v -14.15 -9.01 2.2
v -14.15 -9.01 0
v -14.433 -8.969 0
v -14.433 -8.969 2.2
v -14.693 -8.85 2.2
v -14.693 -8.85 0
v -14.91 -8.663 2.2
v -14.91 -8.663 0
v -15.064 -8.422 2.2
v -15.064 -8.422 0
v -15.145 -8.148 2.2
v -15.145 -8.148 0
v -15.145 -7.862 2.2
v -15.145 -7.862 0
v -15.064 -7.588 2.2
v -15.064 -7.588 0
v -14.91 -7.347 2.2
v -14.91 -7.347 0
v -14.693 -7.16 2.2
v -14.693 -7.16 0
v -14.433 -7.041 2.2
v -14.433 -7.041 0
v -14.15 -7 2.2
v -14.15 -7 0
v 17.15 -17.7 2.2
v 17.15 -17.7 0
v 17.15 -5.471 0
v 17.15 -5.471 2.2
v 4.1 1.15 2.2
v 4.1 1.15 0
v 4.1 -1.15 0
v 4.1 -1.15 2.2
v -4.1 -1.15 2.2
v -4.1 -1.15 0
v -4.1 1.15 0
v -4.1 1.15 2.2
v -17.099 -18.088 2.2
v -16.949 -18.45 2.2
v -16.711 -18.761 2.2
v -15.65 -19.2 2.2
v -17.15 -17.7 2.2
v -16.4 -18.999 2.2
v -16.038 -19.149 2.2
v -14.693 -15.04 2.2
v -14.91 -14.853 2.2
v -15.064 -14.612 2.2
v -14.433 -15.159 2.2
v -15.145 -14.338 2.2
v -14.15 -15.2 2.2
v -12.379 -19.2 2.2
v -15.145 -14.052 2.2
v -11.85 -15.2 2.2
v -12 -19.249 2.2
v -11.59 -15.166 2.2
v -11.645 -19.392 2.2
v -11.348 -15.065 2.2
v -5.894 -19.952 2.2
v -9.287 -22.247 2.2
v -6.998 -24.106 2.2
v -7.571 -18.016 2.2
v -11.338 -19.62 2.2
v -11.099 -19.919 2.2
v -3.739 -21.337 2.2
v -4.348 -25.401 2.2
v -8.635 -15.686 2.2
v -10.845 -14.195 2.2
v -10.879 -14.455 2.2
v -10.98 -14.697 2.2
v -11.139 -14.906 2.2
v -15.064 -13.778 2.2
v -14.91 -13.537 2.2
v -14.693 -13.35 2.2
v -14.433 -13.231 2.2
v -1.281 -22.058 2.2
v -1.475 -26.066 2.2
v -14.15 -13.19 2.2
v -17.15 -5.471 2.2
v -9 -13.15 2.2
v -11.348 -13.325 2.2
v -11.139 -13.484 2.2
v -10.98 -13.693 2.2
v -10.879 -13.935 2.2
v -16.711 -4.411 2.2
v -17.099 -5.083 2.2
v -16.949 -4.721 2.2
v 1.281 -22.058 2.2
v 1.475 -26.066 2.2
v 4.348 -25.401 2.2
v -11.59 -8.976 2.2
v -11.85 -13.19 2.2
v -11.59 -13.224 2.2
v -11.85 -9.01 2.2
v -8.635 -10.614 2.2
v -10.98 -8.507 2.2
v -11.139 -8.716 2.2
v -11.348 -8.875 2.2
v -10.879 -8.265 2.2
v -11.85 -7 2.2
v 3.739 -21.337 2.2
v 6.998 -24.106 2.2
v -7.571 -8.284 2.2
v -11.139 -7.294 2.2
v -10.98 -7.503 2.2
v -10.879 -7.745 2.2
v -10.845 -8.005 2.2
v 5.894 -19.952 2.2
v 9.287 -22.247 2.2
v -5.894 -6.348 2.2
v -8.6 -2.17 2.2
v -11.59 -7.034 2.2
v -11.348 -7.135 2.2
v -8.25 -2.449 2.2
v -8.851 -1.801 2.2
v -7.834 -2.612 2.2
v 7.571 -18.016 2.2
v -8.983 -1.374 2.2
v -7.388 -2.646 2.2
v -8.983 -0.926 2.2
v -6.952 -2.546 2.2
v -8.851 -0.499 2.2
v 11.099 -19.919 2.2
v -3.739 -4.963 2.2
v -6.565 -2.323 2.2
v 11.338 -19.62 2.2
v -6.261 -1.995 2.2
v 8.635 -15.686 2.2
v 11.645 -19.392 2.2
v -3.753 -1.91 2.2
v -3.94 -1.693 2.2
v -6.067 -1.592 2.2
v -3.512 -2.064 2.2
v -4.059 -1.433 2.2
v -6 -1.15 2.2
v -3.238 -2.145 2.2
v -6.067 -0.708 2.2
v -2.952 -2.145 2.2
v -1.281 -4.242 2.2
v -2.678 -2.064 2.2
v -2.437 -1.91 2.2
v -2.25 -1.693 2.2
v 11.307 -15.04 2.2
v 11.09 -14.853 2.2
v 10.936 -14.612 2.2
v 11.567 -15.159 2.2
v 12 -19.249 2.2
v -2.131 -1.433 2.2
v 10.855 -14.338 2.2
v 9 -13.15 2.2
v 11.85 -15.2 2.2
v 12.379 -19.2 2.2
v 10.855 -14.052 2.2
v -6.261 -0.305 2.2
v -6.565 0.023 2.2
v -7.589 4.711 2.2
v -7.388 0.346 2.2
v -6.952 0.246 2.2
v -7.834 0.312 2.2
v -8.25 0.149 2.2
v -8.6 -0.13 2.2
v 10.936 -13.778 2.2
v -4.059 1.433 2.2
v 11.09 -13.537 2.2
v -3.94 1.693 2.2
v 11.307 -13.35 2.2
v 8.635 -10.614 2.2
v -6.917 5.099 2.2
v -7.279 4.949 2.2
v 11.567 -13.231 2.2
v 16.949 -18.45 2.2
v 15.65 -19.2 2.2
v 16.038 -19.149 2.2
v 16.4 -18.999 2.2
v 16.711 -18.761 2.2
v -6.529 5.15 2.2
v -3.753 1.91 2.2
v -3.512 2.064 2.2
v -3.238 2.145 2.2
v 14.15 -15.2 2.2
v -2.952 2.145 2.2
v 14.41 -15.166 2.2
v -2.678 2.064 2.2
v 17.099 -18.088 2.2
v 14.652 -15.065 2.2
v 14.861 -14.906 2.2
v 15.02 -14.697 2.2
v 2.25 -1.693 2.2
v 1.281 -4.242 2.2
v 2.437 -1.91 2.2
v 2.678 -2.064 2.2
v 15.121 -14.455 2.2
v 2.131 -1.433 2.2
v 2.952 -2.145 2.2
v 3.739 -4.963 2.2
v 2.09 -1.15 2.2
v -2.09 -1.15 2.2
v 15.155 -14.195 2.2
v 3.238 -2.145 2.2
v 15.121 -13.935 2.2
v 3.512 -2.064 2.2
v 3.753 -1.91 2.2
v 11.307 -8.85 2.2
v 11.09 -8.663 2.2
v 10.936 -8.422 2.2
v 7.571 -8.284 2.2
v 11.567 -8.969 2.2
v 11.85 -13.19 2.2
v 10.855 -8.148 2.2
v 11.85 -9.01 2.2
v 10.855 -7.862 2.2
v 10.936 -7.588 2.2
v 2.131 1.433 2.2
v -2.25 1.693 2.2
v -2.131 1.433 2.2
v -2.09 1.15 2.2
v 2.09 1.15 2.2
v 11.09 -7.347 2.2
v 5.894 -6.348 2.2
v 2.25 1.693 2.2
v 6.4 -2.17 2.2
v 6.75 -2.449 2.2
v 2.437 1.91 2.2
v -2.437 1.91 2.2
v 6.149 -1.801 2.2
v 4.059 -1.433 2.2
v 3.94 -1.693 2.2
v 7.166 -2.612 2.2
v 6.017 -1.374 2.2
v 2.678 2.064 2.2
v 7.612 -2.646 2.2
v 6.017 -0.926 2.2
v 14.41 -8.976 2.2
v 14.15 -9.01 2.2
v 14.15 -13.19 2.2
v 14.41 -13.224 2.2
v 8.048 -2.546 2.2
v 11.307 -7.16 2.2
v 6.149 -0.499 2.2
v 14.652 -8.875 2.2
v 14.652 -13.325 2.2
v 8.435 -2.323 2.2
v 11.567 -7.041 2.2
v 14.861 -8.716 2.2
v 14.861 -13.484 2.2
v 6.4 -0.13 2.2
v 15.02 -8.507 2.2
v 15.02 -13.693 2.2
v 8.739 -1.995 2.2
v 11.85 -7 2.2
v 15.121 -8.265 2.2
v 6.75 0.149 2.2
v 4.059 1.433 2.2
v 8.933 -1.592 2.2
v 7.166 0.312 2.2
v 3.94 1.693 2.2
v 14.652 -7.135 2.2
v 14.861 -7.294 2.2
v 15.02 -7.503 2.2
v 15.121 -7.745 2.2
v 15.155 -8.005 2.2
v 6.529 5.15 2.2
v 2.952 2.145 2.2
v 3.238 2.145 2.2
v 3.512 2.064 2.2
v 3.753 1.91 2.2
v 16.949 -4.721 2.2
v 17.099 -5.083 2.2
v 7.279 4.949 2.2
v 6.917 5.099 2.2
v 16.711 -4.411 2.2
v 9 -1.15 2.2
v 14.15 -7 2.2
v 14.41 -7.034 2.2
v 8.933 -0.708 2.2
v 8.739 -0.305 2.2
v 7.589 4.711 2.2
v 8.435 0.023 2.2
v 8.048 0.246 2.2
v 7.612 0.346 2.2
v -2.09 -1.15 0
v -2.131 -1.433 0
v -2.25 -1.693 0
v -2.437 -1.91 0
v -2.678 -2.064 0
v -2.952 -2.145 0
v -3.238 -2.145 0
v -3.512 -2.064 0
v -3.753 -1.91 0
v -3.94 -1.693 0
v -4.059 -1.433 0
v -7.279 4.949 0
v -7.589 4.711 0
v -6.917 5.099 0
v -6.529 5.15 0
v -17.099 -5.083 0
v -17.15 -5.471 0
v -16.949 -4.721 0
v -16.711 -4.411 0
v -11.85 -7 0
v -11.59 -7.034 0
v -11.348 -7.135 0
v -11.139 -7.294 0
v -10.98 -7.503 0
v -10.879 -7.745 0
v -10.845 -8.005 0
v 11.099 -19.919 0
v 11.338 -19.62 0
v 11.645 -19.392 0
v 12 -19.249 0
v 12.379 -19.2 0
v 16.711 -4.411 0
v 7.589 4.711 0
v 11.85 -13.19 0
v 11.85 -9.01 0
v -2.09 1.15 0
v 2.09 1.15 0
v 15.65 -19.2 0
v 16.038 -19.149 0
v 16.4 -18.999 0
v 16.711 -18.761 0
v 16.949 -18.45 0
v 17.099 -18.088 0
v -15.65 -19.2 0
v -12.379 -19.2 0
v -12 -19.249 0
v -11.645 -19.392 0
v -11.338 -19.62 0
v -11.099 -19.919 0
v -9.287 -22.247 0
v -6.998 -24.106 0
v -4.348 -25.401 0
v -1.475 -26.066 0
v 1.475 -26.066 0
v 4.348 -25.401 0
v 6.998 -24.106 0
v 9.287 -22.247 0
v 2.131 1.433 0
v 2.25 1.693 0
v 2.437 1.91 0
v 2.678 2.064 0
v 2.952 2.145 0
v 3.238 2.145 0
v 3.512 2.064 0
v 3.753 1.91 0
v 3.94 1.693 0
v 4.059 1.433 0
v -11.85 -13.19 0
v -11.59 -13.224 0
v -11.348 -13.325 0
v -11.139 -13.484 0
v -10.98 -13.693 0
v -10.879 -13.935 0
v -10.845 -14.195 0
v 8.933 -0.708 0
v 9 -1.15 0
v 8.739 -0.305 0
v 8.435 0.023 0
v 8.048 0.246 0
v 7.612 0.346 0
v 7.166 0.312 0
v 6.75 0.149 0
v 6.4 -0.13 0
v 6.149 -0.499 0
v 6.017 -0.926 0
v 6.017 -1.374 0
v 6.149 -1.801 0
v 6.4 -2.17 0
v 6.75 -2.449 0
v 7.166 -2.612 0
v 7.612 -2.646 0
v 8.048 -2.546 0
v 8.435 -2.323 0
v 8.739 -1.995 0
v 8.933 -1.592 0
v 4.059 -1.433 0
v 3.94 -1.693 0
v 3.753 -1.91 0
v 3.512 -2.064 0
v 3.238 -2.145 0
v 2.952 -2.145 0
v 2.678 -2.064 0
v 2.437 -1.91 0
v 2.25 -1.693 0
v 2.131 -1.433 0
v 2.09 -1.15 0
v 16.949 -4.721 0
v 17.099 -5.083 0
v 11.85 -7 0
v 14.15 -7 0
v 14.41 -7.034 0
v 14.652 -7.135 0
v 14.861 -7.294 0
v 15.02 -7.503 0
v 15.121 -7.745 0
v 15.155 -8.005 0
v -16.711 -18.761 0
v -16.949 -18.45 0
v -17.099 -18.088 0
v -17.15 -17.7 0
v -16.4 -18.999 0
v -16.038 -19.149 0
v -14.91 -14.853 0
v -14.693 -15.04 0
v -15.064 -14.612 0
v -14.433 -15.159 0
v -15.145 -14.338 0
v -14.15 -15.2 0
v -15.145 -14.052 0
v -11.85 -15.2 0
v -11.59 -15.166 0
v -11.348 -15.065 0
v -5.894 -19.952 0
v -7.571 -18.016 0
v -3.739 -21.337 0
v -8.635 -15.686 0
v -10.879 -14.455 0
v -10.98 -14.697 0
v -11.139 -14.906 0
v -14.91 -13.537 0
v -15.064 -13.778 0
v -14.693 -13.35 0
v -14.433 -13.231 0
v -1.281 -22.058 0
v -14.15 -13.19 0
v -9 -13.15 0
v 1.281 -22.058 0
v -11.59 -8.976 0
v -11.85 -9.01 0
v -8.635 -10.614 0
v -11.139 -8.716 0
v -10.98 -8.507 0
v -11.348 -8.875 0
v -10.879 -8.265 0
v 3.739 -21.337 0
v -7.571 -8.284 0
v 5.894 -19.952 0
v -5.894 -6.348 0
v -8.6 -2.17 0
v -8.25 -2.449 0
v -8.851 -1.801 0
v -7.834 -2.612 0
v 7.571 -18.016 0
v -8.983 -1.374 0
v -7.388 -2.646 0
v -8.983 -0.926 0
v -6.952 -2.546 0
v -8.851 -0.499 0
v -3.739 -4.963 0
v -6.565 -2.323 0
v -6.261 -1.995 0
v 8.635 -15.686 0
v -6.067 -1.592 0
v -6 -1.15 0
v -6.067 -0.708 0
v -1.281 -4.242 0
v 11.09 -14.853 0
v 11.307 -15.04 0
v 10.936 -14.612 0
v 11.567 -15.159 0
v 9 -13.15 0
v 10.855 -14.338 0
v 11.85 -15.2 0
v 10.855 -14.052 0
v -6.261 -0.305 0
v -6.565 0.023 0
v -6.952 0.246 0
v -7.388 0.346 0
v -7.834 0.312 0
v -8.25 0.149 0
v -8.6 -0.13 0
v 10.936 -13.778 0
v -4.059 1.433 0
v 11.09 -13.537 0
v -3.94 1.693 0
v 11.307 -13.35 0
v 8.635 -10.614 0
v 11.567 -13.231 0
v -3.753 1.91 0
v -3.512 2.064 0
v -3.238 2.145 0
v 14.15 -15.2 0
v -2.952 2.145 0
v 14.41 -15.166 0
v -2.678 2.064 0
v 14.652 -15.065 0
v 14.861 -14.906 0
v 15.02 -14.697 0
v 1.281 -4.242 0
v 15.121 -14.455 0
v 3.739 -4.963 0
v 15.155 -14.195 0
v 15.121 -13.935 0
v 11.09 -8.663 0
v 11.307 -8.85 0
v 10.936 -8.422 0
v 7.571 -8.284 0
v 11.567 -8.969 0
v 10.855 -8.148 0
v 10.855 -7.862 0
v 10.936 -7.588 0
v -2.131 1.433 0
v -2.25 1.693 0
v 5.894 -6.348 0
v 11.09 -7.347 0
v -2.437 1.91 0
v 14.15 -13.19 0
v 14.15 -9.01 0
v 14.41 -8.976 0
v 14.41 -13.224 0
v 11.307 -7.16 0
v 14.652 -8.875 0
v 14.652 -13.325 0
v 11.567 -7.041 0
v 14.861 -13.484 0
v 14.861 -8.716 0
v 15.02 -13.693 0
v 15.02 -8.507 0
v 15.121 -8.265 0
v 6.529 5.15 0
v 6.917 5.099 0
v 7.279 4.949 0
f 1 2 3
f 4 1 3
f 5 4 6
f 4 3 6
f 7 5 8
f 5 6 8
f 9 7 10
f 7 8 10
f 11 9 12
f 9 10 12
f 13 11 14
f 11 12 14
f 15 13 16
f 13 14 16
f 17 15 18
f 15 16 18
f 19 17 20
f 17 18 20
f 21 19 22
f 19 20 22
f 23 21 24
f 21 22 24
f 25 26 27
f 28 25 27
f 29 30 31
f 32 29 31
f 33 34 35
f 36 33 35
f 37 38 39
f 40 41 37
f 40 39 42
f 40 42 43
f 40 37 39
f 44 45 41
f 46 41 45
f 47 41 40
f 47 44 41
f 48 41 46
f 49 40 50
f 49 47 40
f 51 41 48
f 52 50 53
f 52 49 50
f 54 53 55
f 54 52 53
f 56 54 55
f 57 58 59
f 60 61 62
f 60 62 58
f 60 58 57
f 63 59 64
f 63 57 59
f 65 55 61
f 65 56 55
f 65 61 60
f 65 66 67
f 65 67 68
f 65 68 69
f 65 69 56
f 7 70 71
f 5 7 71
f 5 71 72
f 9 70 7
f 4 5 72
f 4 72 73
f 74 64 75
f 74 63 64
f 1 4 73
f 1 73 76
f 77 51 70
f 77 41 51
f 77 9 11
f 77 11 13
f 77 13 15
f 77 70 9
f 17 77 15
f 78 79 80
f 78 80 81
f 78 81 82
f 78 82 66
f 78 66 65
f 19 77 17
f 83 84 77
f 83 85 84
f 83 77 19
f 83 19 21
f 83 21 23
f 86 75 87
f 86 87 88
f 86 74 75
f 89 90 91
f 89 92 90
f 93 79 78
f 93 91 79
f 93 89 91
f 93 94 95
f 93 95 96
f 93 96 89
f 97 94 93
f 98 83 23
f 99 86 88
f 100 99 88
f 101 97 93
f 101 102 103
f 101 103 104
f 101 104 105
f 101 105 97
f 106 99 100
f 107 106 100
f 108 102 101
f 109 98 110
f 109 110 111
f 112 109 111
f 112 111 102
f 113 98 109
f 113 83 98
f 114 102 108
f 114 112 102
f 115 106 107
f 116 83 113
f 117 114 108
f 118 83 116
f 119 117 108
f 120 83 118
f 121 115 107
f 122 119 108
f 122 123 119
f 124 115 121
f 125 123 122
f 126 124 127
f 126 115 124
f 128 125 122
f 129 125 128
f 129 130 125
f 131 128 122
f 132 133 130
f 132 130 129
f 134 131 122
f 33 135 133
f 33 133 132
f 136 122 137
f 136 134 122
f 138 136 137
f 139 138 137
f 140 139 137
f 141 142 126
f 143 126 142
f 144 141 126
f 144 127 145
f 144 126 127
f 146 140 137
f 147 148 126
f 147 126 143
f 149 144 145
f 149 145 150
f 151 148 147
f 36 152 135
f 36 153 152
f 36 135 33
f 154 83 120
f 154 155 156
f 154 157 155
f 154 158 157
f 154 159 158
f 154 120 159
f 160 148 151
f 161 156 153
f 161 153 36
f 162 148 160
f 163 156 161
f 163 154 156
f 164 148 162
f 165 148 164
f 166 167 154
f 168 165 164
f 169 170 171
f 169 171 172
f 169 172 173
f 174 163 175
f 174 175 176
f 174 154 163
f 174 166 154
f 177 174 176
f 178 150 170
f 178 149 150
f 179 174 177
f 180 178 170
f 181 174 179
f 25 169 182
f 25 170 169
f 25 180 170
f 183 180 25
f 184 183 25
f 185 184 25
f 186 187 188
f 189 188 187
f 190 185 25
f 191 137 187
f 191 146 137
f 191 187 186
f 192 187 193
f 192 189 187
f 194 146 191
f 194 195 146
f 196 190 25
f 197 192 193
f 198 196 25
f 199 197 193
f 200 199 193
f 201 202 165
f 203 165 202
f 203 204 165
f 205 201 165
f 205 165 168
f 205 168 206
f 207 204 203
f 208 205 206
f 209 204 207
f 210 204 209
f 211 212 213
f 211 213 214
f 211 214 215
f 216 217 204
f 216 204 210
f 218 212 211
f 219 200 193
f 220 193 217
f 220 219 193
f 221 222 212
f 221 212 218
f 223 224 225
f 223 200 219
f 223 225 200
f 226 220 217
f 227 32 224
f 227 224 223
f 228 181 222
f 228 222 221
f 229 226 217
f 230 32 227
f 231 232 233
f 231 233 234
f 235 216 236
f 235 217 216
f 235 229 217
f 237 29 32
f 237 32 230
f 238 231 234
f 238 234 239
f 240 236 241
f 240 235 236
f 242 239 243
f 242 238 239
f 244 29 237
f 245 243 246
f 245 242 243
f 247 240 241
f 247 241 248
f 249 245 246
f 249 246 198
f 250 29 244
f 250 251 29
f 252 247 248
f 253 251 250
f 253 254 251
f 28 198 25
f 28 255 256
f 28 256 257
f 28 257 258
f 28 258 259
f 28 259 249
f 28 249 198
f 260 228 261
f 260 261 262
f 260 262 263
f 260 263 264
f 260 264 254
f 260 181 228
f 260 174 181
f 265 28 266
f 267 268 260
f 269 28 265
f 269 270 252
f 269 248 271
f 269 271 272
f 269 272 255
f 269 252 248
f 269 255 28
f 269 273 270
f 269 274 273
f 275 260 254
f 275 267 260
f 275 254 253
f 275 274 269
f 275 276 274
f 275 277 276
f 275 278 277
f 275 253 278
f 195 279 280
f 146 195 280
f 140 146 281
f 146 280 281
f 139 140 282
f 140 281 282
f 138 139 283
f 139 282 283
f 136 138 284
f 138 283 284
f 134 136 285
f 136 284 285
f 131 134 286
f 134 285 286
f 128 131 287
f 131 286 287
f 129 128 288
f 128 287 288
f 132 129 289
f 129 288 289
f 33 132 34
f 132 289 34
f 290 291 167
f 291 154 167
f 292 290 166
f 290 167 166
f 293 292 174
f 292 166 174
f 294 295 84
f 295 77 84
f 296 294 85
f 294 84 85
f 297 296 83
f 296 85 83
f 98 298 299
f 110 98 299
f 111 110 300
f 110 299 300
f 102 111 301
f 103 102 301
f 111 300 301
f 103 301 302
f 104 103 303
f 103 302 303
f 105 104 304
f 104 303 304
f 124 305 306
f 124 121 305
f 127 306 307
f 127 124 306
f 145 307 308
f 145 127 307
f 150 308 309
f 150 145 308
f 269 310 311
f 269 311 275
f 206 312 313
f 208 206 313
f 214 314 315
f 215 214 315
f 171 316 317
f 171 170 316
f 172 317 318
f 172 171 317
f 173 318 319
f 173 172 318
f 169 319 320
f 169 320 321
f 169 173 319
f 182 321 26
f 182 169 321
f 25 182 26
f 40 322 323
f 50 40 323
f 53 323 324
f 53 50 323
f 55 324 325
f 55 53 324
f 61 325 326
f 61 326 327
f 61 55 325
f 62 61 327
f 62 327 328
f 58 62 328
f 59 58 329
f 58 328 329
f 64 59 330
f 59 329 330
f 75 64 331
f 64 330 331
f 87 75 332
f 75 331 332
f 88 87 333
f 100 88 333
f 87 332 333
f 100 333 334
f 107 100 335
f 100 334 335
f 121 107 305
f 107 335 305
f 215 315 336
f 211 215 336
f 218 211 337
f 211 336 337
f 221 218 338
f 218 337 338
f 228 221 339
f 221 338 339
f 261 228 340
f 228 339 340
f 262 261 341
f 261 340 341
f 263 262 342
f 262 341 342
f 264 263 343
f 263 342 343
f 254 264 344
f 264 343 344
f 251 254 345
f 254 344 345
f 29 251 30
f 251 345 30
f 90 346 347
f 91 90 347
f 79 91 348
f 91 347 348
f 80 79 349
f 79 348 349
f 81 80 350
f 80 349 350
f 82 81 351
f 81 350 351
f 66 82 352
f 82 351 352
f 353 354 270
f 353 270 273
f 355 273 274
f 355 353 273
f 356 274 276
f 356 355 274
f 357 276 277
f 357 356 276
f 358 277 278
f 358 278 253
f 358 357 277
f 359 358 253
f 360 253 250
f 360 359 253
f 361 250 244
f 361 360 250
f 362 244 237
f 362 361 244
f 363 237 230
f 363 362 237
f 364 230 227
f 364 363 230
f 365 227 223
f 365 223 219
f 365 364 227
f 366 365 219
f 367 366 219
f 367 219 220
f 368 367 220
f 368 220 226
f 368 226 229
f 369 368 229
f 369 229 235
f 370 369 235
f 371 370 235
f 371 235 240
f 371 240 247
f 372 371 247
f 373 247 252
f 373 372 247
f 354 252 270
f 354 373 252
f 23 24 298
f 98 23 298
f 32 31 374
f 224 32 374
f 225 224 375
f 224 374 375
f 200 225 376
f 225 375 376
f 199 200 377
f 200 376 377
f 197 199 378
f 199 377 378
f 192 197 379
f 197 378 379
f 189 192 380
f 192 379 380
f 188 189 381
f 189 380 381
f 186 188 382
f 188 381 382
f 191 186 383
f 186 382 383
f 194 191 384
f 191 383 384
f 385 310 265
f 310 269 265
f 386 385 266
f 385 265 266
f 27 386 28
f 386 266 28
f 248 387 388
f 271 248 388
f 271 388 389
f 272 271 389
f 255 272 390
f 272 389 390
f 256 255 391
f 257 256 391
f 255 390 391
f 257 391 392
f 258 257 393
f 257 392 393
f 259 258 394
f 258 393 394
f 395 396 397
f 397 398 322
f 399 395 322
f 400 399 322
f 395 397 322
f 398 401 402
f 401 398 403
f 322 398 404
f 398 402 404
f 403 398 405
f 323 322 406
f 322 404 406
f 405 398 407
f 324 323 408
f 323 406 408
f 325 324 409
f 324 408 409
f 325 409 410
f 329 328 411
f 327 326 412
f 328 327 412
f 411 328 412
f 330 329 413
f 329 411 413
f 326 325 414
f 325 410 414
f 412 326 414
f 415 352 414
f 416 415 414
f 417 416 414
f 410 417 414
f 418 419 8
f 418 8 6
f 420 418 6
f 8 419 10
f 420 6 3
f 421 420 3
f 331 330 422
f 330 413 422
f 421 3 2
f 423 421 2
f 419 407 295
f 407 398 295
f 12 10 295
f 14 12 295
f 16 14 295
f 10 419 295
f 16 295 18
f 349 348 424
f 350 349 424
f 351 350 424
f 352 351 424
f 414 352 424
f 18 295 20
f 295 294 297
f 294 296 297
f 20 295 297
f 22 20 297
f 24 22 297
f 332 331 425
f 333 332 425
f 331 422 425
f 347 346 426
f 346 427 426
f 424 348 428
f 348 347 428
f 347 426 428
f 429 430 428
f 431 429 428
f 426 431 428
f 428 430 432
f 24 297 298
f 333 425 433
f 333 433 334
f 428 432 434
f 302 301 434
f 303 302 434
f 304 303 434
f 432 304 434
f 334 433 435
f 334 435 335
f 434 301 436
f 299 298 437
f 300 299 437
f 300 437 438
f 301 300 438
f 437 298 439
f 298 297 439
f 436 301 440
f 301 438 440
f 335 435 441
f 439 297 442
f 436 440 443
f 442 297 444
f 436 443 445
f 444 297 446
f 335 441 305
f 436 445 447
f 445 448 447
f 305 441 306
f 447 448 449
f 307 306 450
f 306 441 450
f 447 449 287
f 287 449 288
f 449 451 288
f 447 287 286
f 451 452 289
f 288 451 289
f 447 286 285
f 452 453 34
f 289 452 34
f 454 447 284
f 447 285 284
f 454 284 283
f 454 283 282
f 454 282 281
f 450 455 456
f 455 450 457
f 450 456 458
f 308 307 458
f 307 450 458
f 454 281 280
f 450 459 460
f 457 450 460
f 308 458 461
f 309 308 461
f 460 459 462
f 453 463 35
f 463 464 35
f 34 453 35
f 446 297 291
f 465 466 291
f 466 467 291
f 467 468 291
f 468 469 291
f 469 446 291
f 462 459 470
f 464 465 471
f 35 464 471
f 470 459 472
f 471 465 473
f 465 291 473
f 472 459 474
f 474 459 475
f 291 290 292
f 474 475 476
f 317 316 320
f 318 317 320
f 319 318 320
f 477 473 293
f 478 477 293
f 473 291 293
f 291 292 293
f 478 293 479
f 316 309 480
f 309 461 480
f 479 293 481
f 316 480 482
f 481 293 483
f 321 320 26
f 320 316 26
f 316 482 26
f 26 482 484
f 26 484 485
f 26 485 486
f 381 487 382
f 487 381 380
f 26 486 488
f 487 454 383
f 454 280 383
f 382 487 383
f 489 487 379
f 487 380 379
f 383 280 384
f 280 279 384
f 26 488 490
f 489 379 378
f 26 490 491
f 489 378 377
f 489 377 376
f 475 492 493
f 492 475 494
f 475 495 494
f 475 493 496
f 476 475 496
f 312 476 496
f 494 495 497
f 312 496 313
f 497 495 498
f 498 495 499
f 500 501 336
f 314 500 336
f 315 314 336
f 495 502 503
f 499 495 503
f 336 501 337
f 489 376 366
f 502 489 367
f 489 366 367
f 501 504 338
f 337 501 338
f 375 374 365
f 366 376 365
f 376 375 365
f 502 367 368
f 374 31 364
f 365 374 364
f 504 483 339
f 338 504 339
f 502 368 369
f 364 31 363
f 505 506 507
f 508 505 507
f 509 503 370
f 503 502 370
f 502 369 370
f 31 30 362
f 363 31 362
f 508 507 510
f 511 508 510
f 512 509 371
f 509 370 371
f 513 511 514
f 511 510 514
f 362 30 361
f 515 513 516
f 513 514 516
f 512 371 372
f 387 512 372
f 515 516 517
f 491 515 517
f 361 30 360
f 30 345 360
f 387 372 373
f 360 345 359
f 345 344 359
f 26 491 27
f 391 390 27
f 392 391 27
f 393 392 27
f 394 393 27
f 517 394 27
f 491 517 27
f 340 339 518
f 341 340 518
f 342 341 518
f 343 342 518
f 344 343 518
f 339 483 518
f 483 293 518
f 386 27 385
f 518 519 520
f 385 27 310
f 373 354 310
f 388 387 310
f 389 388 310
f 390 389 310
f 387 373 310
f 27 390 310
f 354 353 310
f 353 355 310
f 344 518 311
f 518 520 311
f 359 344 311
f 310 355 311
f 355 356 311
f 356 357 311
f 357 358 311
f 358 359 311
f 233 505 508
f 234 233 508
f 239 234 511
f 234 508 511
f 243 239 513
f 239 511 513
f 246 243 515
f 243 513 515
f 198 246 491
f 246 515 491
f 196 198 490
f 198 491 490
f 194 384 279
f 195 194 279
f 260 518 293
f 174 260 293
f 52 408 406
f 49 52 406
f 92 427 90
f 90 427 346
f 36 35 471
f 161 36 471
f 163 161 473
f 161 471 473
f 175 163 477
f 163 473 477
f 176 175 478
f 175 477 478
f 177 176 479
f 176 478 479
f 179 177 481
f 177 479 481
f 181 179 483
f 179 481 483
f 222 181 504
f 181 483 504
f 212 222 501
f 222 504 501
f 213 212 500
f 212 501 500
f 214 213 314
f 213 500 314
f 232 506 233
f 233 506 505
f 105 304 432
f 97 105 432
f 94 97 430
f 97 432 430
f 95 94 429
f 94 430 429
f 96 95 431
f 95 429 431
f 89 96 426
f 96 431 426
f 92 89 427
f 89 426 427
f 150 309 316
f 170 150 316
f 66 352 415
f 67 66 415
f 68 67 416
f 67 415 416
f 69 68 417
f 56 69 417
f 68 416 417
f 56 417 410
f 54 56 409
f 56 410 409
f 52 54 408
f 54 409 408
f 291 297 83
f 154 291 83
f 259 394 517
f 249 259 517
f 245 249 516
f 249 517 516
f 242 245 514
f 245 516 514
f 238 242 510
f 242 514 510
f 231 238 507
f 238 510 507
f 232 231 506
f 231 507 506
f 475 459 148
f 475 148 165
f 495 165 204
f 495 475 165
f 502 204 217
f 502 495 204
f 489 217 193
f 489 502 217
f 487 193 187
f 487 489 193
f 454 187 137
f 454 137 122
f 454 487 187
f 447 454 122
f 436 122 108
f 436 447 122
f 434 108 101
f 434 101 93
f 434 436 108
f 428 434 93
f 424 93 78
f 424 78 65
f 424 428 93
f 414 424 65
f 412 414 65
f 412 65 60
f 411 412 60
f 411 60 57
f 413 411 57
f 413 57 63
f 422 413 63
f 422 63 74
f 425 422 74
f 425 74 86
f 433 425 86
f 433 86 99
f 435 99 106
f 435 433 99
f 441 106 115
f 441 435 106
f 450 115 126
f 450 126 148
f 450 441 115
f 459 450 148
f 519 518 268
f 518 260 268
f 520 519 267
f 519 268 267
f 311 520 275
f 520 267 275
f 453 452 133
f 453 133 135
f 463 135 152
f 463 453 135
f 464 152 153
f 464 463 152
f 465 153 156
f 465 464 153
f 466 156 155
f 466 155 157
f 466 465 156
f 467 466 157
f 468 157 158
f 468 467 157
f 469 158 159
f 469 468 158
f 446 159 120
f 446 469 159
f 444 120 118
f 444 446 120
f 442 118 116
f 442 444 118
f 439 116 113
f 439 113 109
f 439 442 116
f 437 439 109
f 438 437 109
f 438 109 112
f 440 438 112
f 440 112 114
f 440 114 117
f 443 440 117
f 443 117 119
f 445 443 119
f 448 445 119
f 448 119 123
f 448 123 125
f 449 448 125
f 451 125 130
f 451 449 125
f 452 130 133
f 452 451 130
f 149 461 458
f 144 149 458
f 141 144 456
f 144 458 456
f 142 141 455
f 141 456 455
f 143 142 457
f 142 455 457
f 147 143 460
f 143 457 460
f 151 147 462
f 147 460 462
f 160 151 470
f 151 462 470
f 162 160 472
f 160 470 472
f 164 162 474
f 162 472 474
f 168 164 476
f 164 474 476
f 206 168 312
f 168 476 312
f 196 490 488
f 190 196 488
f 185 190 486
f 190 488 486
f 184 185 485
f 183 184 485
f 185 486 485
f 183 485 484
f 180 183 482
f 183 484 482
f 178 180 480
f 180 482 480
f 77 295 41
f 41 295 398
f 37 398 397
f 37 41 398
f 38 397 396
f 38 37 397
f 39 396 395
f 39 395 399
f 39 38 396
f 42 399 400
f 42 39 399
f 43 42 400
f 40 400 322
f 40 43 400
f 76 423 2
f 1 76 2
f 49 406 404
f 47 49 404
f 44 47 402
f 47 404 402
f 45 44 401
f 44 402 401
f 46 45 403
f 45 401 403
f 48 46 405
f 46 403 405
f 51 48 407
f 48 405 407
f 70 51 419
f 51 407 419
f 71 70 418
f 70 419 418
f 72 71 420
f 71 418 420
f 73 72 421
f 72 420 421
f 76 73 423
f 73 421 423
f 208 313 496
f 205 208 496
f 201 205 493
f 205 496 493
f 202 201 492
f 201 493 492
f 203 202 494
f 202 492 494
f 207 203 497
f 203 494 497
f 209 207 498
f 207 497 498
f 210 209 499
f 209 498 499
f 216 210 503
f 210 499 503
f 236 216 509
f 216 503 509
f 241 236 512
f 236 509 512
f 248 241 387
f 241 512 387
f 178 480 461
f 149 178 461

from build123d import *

# Parameters (mm, degrees)
SKETCH_1_R      = 9
SKETCH_1_R_2    = 1.5
EXTRUDE_1_DEPTH = 2.2
CHAMFER_1_SIZE  = 10
FILLET_1_R      = 1.5


with BuildPart() as part:
    # 草图1 → 凸台-拉伸1 (new body)
    with BuildSketch(Plane.XY):
        with BuildLine():
            Line((-17.15, -19.2), (-11.506411256, -19.2))
            ThreePointArc((-11.506411256, -19.2), (0, -26.15), (11.506411256, -19.2))
            Line((11.506411256, -19.2), (17.15, -19.2))
            Line((17.15, -19.2), (17.15, 5.15))
            Line((17.15, 5.15), (-17.15, 5.15))
            Line((-17.15, 5.15), (-17.15, -19.2))
        make_face()
        with BuildLine():
            ThreePointArc((-10.845, -14.195), (-11.139357685, -14.905642315), (-11.85, -15.2))
            Line((-11.85, -15.2), (-14.15, -15.2))
            ThreePointArc((-14.15, -15.2), (-15.155, -14.195), (-14.15, -13.19))
            Line((-14.15, -13.19), (-14.15, -9.01))
            ThreePointArc((-14.15, -9.01), (-15.155, -8.005), (-14.15, -7))
            Line((-14.15, -7), (-11.85, -7))
            ThreePointArc((-11.85, -7), (-11.139357685, -7.294357685), (-10.845, -8.005))
            ThreePointArc((-10.845, -8.005), (-11.139357685, -8.715642315), (-11.85, -9.01))
            Line((-11.85, -9.01), (-11.85, -13.19))
            ThreePointArc((-11.85, -13.19), (-11.139357685, -13.484357685), (-10.845, -14.195))
        make_face(mode=Mode.SUBTRACT)
        with Locations((0, -13.15)):
            Circle(SKETCH_1_R, mode=Mode.SUBTRACT)
        with BuildLine():
            ThreePointArc((11.85, -9.01), (10.845, -8.005), (11.85, -7))
            Line((11.85, -7), (14.15, -7))
            ThreePointArc((14.15, -7), (14.860642315, -7.294357685), (15.155, -8.005))
            ThreePointArc((15.155, -8.005), (14.860642315, -8.715642315), (14.15, -9.01))
            Line((14.15, -9.01), (14.15, -13.19))
            ThreePointArc((14.15, -13.19), (14.860642315, -13.484357685), (15.155, -14.195))
            ThreePointArc((15.155, -14.195), (14.860642315, -14.905642315), (14.15, -15.2))
            Line((14.15, -15.2), (11.85, -15.2))
            ThreePointArc((11.85, -15.2), (10.845, -14.195), (11.85, -13.19))
            Line((11.85, -13.19), (11.85, -9.01))
        make_face(mode=Mode.SUBTRACT)
        with Locations((-7.5, -1.15)):
            Circle(SKETCH_1_R_2, mode=Mode.SUBTRACT)
        with BuildLine():
            Line((2.09, -1.15), (-2.09, -1.15))
            ThreePointArc((-2.09, -1.15), (-3.095, -2.155), (-4.1, -1.15))
            Line((-4.1, -1.15), (-4.1, 1.15))
            ThreePointArc((-4.1, 1.15), (-3.095, 2.155), (-2.09, 1.15))
            Line((-2.09, 1.15), (2.09, 1.15))
            ThreePointArc((2.09, 1.15), (3.095, 2.155), (4.1, 1.15))
            Line((4.1, 1.15), (4.1, -1.15))
            ThreePointArc((4.1, -1.15), (3.095, -2.155), (2.09, -1.15))
        make_face(mode=Mode.SUBTRACT)
        with Locations((7.5, -1.15)):
            Circle(SKETCH_1_R_2, mode=Mode.SUBTRACT)
    extrude(amount=EXTRUDE_1_DEPTH)

    # 倒角1
    chamfer_1_edges = [part.edges().sort_by_distance(p)[0] for p in [
        (-17.15, 5.15, 1.1),
        (17.15, 5.15, 1.1),
    ]]
    chamfer(chamfer_1_edges, length=CHAMFER_1_SIZE)

    # 圆角1
    fillet_1_edges = [part.edges().sort_by_distance(p)[0] for p in [
        (-17.15, -4.85, 1.1),
        (-17.15, -19.2, 1.1),
        (17.15, -19.2, 1.1),
        (11.506411256, -19.2, 1.1),
        (-11.506411256, -19.2, 1.1),
        (-7.15, 5.15, 1.1),
        (7.15, 5.15, 1.1),
        (17.15, -4.85, 1.1),
    ]]
    fillet(fillet_1_edges, radius=FILLET_1_R)


solid = part.part
